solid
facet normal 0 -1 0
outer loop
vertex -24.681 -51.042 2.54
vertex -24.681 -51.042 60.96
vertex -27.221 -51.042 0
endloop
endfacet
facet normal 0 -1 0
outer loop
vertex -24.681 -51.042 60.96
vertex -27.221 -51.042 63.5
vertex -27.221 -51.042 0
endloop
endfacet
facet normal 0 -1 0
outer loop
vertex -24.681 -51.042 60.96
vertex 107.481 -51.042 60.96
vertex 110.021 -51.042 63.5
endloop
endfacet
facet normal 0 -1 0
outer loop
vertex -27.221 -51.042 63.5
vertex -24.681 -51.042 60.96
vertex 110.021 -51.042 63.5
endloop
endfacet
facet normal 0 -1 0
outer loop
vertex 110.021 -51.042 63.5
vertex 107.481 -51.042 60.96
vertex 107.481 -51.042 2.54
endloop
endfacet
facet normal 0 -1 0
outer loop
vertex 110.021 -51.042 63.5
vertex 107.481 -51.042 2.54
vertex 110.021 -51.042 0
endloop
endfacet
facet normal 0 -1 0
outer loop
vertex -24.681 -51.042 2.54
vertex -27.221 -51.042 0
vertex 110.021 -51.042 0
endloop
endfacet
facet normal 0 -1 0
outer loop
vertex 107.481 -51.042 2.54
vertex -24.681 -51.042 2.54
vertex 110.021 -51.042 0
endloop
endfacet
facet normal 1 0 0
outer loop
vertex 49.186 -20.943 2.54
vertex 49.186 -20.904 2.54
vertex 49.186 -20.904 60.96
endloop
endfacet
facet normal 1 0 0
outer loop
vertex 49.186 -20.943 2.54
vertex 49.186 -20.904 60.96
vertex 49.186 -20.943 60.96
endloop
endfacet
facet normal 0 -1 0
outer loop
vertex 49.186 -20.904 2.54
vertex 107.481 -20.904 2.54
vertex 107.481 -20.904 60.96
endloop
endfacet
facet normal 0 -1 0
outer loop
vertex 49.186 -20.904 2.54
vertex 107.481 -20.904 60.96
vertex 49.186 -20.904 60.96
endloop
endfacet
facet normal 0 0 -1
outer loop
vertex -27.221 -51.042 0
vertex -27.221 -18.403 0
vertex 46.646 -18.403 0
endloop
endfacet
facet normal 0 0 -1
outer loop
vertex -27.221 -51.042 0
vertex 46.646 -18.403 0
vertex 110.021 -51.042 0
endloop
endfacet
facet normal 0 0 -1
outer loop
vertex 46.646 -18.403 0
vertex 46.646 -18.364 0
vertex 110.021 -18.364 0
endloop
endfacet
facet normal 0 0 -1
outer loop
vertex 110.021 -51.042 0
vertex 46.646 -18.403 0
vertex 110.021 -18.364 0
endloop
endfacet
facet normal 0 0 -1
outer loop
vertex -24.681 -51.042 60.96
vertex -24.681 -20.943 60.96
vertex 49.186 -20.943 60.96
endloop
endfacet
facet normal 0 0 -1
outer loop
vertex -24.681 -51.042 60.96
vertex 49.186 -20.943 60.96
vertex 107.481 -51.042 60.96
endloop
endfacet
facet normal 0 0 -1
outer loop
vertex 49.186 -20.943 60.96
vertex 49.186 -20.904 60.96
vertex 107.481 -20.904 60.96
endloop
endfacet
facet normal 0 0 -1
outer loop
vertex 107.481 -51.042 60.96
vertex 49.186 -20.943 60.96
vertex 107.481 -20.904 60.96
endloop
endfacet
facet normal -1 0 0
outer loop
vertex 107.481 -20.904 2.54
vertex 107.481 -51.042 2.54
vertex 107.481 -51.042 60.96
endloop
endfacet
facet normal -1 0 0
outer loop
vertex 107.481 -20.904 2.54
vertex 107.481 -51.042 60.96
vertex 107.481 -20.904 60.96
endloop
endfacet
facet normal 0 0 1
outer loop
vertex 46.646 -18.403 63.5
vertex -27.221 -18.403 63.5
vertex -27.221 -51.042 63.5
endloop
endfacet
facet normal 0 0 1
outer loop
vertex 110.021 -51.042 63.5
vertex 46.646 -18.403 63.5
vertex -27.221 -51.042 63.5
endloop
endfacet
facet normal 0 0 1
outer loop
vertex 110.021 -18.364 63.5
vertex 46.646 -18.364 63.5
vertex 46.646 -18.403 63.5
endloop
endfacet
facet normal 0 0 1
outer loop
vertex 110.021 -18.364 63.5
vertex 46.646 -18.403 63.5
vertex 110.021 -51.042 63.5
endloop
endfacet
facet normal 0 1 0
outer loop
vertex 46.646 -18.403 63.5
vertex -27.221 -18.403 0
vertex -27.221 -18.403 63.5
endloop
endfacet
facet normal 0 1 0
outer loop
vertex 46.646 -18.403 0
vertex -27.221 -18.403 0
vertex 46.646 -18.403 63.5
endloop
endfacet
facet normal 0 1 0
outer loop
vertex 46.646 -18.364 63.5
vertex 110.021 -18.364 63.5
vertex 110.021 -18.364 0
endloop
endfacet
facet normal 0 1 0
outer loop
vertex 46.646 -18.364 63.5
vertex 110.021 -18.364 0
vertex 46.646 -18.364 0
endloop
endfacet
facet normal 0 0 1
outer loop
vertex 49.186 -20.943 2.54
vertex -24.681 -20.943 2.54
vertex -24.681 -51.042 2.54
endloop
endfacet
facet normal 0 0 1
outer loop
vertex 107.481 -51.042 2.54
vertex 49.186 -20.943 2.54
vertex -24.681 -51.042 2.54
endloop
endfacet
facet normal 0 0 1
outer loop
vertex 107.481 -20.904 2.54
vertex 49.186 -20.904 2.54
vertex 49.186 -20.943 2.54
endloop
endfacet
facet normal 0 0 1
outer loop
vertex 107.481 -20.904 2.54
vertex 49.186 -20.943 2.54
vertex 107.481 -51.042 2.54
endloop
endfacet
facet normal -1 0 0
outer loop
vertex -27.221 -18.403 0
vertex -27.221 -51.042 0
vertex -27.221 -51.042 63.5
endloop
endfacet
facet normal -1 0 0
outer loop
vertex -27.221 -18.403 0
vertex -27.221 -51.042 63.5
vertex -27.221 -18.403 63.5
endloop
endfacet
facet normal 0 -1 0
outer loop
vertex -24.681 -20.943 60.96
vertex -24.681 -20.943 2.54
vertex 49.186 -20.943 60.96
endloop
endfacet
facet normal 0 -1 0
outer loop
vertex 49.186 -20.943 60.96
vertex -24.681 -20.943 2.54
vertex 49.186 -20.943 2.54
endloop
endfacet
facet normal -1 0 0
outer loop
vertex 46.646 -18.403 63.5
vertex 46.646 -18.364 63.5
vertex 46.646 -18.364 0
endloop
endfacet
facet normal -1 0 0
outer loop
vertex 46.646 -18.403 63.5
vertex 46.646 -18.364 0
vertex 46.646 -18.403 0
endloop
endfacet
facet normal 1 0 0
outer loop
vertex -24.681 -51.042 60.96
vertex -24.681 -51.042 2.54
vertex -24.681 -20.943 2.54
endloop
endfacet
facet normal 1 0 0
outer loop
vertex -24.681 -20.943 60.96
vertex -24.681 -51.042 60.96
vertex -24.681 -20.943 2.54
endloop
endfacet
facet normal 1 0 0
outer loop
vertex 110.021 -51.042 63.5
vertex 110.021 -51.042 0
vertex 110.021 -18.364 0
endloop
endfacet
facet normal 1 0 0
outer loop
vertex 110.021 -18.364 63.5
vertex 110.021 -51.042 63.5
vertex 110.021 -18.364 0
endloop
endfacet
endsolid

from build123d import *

# Parameters (mm, degrees)
F0_W     = 73.8667733967
F0_H     = 32.6388925314
F1_DEPTH = 63.5
F2_T     = -2.54


with BuildPart() as f1:
    # F0 (on Top) → F1 (new body)
    with BuildSketch(Plane.XY):
        Polygon((46.6460995376, -18.4034332633), (46.6460995376, -51.0423257947), (110.020622611, -51.0423257947), (110.020622611, -18.363982439), (46.6460995376, -18.363982439), align=None)
        with Locations((9.7127128392, -34.722879529)):
            Rectangle(F0_W, F0_H)
    extrude(amount=F1_DEPTH)

    # F2
    f2_openings = [f1.faces().sort_by_distance(p)[0] for p in [
        (41.399974, -51.042326, 31.75),
    ]]
    offset(amount=F2_T, openings=f2_openings, kind=Kind.INTERSECTION)


solid = f1.part
